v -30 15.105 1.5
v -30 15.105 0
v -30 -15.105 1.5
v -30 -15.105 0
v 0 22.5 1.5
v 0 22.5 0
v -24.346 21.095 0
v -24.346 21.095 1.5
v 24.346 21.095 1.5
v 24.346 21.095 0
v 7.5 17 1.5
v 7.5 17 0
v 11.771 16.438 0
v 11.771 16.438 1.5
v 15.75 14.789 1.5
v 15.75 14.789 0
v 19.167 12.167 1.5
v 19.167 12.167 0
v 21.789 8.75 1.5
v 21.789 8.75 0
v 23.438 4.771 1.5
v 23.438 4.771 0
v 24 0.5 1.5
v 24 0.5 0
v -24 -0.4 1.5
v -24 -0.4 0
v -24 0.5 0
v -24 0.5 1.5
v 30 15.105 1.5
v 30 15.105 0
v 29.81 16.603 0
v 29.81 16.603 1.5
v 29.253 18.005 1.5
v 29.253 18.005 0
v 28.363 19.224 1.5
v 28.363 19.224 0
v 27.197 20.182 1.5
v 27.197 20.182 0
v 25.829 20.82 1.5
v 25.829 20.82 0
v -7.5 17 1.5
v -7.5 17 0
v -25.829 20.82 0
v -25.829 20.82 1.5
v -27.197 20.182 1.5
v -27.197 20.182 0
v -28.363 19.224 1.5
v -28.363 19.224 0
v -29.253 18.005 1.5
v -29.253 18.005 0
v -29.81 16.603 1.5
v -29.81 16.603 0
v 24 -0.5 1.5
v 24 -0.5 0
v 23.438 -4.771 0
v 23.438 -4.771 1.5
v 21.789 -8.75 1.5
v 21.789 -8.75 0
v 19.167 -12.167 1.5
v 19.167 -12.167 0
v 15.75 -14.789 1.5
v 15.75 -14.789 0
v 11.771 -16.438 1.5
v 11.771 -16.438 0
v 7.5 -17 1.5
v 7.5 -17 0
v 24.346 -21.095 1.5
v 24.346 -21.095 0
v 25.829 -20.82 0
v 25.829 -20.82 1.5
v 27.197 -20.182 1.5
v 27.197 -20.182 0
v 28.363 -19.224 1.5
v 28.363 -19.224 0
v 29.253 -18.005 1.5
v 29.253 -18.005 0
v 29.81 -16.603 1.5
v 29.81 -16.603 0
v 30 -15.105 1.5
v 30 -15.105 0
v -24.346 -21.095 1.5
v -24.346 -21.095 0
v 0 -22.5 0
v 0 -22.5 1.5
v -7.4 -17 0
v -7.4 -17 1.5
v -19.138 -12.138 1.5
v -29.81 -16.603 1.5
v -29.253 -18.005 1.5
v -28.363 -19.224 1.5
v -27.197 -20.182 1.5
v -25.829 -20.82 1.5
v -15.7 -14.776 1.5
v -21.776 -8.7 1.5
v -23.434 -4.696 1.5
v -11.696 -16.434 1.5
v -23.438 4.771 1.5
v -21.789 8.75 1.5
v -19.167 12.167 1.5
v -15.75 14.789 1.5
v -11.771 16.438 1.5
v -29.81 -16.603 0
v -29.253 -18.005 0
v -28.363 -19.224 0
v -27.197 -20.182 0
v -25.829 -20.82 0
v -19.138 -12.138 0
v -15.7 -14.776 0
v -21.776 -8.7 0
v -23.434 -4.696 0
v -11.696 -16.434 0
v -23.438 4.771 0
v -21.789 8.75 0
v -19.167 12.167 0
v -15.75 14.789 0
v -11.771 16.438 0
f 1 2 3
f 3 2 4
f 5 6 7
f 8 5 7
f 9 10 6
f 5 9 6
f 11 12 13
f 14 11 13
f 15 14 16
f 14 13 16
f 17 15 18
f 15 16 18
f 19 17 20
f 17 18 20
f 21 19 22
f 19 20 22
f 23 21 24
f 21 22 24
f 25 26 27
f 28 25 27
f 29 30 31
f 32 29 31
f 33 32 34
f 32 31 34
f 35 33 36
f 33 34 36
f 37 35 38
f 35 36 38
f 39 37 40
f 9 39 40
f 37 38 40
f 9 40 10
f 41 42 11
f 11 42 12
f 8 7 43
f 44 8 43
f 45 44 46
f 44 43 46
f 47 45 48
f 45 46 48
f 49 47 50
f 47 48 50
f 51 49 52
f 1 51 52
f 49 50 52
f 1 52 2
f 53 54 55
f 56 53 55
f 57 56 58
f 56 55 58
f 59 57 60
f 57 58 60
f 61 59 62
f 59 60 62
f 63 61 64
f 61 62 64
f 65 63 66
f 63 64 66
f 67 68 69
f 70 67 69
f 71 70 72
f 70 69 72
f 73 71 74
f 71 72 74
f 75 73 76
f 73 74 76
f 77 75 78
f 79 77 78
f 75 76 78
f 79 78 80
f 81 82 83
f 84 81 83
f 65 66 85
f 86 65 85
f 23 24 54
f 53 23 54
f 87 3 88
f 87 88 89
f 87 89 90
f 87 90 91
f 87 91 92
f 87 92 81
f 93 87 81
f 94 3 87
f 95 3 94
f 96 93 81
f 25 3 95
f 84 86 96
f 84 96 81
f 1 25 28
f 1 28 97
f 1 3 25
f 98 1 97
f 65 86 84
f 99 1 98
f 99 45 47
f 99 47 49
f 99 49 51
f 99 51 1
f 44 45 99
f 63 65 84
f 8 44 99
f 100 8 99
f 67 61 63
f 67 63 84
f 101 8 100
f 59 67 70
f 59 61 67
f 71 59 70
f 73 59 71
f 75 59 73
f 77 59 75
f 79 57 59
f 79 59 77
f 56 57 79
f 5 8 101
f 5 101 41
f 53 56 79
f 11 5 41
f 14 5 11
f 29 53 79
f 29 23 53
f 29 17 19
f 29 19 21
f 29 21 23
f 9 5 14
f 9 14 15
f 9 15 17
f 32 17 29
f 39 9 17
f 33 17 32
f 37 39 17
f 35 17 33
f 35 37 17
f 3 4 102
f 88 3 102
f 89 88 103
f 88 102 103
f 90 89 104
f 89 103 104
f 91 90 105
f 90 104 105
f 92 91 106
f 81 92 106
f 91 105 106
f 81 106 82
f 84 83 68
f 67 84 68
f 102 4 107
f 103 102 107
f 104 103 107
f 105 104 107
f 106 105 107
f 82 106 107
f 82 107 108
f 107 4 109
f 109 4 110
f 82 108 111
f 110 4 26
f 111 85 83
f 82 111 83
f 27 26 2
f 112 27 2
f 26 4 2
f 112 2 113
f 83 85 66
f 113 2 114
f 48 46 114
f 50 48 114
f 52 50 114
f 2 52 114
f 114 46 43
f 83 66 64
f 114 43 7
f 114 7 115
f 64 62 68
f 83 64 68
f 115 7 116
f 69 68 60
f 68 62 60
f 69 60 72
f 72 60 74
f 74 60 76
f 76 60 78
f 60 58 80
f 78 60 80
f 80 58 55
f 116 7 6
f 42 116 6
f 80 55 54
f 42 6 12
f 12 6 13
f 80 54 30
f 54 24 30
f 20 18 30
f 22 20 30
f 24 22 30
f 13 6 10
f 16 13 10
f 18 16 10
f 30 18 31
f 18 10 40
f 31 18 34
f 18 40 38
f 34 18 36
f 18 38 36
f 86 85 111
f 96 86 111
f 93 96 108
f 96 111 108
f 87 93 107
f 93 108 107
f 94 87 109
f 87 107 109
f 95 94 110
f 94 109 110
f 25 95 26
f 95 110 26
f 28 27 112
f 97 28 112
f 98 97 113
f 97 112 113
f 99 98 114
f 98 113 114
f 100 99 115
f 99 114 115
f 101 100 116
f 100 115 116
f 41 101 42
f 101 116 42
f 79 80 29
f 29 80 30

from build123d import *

# Parameters (mm, degrees)
F1_DEPTH = 1.5


with BuildPart() as f1:
    # F0 (on Top) → F1 (new body)
    with BuildSketch(Plane.XY):
        with BuildLine():
            ThreePointArc((24.345579, -21.095447), (28.363111, -19.224056), (30, -15.105408))
            Line((30, -15.105408), (30, 15.105408))
            ThreePointArc((30, 15.105408), (28.363111, 19.224056), (24.345579, 21.095447))
            Line((24.345579, 21.095447), (0, 22.5))
            Line((0, 22.5), (-24.345579, 21.095447))
            ThreePointArc((-24.345579, 21.095447), (-28.363111, 19.224056), (-30, 15.105408))
            Line((-30, 15.105408), (-30, -15.105408))
            ThreePointArc((-30, -15.105408), (-28.363111, -19.224056), (-24.345579, -21.095447))
            Line((-24.345579, -21.095447), (0, -22.5))
            Line((0, -22.5), (24.345579, -21.095447))
        make_face()
        with BuildLine():
            ThreePointArc((24, -0.5), (19.167262, -12.167262), (7.5, -17))
            Line((7.5, -17), (-7.4, -17))
            ThreePointArc((-7.4, -17), (-19.137973, -12.137973), (-24, -0.4))
            Line((-24, -0.4), (-24, 0.5))
            ThreePointArc((-24, 0.5), (-19.167262, 12.167262), (-7.5, 17))
            Line((-7.5, 17), (7.5, 17))
            ThreePointArc((7.5, 17), (19.167262, 12.167262), (24, 0.5))
            Line((24, 0.5), (24, -0.5))
        make_face(mode=Mode.SUBTRACT)
    extrude(amount=F1_DEPTH)


solid = f1.part
